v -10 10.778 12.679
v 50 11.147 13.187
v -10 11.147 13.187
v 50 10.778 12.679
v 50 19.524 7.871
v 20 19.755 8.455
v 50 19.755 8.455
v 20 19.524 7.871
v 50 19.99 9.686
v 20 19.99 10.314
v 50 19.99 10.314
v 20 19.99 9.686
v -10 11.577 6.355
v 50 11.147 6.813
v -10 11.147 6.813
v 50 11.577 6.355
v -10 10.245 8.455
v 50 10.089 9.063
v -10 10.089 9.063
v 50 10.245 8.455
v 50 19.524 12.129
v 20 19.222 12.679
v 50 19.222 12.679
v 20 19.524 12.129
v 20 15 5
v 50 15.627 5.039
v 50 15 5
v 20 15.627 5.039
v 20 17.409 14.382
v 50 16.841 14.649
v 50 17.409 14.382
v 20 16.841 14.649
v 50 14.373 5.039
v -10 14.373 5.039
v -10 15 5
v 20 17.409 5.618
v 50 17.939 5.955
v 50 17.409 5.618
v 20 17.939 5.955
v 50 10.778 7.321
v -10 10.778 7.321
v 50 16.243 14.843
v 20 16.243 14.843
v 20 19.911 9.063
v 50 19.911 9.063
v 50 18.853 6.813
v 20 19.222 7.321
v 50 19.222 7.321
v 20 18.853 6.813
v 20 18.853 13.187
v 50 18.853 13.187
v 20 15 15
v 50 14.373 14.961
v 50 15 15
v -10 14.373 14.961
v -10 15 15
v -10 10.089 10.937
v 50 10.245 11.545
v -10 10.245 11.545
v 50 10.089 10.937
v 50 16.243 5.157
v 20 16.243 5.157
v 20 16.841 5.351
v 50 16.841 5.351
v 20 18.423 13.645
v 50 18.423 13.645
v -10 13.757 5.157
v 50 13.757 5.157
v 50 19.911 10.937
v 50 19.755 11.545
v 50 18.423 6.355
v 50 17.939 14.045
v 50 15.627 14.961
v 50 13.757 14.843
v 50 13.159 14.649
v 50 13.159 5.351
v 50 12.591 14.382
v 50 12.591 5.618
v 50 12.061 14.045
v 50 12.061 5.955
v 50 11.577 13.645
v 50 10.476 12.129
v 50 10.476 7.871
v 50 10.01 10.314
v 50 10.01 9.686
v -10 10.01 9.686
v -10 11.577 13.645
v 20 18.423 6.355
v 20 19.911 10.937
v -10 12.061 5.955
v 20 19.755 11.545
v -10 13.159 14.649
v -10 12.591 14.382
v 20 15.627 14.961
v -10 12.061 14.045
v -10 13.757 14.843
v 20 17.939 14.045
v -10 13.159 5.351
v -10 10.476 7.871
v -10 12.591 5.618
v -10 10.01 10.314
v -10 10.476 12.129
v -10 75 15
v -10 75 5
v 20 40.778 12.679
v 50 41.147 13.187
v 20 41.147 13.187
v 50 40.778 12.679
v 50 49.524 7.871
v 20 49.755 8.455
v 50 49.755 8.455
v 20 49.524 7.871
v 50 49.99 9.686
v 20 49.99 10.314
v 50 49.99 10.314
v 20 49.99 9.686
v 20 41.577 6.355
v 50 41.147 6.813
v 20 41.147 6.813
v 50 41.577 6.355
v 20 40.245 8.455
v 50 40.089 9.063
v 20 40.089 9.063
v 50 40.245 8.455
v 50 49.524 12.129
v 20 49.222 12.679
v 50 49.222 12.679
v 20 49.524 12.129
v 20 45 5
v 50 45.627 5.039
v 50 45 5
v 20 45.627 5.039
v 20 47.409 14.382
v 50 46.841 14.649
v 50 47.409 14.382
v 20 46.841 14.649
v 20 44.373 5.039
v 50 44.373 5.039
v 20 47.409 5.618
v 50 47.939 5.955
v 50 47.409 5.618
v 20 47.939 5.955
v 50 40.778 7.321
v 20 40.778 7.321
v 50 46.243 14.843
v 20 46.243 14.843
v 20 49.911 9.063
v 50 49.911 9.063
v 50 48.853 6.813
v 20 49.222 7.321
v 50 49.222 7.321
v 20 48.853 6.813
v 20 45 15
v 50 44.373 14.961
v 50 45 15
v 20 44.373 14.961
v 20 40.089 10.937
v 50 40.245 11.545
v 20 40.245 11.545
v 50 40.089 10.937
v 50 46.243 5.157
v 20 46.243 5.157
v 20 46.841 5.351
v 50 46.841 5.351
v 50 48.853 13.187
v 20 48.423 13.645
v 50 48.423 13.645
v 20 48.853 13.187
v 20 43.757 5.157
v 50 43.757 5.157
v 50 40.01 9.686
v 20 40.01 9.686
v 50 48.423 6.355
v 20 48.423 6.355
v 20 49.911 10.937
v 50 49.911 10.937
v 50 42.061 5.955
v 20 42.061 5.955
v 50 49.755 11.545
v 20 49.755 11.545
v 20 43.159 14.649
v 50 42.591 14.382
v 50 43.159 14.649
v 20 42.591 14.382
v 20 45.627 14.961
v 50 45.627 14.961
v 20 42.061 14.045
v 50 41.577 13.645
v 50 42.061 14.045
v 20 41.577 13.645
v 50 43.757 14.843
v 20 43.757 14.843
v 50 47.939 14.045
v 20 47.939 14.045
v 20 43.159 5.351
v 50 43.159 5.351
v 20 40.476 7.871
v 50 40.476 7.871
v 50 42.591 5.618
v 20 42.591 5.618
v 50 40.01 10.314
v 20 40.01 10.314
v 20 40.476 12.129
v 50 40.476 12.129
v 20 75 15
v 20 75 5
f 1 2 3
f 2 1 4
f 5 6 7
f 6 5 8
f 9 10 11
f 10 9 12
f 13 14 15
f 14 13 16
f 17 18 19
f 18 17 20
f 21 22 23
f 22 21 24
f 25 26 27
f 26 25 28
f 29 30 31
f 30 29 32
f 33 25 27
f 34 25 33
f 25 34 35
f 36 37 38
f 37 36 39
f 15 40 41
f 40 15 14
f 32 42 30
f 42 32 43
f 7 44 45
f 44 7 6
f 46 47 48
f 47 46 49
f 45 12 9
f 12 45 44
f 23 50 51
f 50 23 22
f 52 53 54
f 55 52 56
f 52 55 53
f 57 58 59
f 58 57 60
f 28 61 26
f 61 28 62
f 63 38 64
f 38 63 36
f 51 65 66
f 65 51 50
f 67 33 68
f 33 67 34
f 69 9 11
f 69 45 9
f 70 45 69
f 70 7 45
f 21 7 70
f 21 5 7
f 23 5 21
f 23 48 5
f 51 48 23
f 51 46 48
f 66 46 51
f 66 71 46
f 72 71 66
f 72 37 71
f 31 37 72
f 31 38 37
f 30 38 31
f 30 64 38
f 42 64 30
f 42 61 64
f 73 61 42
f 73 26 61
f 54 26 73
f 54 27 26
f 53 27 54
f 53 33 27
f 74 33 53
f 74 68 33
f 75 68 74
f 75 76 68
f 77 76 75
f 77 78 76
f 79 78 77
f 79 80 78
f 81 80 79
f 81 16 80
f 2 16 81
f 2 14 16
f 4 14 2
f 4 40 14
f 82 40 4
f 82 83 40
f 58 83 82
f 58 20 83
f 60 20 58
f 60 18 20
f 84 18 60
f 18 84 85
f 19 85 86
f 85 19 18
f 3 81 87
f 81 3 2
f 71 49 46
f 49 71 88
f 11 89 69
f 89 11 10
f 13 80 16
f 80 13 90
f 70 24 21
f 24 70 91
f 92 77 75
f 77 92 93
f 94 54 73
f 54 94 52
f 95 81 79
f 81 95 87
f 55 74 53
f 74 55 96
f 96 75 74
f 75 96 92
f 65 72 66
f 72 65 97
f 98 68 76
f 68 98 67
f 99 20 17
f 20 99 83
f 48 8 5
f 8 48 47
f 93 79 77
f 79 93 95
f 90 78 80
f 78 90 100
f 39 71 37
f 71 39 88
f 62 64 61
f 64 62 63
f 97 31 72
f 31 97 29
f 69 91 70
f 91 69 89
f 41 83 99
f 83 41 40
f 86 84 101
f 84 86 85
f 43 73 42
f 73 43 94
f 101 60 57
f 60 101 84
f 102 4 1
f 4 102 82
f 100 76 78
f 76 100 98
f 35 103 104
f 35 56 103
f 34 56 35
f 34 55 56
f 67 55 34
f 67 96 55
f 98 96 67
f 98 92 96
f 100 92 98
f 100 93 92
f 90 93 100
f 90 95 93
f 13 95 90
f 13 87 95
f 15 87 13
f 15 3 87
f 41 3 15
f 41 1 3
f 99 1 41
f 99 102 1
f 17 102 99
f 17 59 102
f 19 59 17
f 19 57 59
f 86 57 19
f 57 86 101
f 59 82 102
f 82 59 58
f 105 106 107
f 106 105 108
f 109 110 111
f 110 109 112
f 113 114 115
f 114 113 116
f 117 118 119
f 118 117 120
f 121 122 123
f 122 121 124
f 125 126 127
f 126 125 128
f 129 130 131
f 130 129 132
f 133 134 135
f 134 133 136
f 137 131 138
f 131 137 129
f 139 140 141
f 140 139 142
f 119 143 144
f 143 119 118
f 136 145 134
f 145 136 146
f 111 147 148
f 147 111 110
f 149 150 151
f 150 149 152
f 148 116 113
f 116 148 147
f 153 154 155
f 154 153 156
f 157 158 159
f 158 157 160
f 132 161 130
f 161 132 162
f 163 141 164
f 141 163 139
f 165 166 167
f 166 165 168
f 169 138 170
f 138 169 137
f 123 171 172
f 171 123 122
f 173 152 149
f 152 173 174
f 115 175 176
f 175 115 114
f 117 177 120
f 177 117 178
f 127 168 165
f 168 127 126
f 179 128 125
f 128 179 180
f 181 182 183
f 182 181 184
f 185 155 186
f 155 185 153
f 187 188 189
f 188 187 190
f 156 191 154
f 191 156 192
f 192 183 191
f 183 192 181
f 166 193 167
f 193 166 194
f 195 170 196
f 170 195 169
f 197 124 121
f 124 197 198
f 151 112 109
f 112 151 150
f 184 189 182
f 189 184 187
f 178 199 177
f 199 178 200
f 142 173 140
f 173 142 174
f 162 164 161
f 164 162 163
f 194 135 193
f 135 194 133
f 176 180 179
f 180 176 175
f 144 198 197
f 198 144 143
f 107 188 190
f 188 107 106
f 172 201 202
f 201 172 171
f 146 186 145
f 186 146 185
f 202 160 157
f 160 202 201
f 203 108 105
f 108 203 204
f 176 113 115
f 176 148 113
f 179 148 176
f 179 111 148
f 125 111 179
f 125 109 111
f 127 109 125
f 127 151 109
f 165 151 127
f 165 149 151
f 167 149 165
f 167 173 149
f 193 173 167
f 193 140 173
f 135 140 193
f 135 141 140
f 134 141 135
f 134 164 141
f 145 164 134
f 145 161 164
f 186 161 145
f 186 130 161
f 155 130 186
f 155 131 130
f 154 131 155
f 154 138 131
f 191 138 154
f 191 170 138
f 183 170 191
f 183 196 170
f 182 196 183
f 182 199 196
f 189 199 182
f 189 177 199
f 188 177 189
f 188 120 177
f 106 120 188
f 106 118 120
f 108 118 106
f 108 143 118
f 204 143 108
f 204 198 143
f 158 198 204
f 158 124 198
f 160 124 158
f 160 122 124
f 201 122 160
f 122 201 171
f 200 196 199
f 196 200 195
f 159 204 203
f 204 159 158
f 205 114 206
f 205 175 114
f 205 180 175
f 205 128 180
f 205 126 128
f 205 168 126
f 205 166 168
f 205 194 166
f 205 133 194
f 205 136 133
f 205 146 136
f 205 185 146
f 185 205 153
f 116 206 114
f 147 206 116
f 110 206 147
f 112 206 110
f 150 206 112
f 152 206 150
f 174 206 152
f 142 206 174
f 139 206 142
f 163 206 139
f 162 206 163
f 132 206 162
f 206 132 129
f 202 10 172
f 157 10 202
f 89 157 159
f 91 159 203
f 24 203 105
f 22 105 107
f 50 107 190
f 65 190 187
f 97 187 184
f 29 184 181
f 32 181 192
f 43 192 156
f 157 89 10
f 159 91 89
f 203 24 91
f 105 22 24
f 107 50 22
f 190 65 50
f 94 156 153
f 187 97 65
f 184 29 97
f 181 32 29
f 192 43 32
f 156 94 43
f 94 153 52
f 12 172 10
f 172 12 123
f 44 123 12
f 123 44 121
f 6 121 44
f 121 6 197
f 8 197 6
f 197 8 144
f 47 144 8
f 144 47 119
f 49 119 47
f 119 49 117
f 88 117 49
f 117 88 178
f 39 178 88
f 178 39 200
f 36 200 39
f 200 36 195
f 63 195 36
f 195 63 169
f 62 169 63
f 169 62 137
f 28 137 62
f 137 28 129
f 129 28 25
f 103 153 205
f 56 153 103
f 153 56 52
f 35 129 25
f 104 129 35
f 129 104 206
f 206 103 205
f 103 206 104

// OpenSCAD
$fn=50;

len=60;
wid=30;
thick=10;

module block(){
  cube(size=[len,wid,thick], center=false);
}

module scoopEnd(){
  width=2*wid;
  r=5;
    rotate([0,90,0])
      cylinder(r=r, h=width);
}

module scoopMiddle(){
  cube(size=[30,wid*2,thick],center=false);
}

module scoop(){
  xoff=-10;
  y2off=45;
  yoff=15;
  zoff=thick;

  union(){
    translate([xoff,yoff,zoff])
      scoopEnd();
    translate([xoff,y2off,zoff])
      scoopEnd();

    translate([xoff,yoff,zoff/2])
      scoopMiddle();
  }
}

module assemble(){
  difference(){
    block();
    scoop();
  }
}

scoop();
